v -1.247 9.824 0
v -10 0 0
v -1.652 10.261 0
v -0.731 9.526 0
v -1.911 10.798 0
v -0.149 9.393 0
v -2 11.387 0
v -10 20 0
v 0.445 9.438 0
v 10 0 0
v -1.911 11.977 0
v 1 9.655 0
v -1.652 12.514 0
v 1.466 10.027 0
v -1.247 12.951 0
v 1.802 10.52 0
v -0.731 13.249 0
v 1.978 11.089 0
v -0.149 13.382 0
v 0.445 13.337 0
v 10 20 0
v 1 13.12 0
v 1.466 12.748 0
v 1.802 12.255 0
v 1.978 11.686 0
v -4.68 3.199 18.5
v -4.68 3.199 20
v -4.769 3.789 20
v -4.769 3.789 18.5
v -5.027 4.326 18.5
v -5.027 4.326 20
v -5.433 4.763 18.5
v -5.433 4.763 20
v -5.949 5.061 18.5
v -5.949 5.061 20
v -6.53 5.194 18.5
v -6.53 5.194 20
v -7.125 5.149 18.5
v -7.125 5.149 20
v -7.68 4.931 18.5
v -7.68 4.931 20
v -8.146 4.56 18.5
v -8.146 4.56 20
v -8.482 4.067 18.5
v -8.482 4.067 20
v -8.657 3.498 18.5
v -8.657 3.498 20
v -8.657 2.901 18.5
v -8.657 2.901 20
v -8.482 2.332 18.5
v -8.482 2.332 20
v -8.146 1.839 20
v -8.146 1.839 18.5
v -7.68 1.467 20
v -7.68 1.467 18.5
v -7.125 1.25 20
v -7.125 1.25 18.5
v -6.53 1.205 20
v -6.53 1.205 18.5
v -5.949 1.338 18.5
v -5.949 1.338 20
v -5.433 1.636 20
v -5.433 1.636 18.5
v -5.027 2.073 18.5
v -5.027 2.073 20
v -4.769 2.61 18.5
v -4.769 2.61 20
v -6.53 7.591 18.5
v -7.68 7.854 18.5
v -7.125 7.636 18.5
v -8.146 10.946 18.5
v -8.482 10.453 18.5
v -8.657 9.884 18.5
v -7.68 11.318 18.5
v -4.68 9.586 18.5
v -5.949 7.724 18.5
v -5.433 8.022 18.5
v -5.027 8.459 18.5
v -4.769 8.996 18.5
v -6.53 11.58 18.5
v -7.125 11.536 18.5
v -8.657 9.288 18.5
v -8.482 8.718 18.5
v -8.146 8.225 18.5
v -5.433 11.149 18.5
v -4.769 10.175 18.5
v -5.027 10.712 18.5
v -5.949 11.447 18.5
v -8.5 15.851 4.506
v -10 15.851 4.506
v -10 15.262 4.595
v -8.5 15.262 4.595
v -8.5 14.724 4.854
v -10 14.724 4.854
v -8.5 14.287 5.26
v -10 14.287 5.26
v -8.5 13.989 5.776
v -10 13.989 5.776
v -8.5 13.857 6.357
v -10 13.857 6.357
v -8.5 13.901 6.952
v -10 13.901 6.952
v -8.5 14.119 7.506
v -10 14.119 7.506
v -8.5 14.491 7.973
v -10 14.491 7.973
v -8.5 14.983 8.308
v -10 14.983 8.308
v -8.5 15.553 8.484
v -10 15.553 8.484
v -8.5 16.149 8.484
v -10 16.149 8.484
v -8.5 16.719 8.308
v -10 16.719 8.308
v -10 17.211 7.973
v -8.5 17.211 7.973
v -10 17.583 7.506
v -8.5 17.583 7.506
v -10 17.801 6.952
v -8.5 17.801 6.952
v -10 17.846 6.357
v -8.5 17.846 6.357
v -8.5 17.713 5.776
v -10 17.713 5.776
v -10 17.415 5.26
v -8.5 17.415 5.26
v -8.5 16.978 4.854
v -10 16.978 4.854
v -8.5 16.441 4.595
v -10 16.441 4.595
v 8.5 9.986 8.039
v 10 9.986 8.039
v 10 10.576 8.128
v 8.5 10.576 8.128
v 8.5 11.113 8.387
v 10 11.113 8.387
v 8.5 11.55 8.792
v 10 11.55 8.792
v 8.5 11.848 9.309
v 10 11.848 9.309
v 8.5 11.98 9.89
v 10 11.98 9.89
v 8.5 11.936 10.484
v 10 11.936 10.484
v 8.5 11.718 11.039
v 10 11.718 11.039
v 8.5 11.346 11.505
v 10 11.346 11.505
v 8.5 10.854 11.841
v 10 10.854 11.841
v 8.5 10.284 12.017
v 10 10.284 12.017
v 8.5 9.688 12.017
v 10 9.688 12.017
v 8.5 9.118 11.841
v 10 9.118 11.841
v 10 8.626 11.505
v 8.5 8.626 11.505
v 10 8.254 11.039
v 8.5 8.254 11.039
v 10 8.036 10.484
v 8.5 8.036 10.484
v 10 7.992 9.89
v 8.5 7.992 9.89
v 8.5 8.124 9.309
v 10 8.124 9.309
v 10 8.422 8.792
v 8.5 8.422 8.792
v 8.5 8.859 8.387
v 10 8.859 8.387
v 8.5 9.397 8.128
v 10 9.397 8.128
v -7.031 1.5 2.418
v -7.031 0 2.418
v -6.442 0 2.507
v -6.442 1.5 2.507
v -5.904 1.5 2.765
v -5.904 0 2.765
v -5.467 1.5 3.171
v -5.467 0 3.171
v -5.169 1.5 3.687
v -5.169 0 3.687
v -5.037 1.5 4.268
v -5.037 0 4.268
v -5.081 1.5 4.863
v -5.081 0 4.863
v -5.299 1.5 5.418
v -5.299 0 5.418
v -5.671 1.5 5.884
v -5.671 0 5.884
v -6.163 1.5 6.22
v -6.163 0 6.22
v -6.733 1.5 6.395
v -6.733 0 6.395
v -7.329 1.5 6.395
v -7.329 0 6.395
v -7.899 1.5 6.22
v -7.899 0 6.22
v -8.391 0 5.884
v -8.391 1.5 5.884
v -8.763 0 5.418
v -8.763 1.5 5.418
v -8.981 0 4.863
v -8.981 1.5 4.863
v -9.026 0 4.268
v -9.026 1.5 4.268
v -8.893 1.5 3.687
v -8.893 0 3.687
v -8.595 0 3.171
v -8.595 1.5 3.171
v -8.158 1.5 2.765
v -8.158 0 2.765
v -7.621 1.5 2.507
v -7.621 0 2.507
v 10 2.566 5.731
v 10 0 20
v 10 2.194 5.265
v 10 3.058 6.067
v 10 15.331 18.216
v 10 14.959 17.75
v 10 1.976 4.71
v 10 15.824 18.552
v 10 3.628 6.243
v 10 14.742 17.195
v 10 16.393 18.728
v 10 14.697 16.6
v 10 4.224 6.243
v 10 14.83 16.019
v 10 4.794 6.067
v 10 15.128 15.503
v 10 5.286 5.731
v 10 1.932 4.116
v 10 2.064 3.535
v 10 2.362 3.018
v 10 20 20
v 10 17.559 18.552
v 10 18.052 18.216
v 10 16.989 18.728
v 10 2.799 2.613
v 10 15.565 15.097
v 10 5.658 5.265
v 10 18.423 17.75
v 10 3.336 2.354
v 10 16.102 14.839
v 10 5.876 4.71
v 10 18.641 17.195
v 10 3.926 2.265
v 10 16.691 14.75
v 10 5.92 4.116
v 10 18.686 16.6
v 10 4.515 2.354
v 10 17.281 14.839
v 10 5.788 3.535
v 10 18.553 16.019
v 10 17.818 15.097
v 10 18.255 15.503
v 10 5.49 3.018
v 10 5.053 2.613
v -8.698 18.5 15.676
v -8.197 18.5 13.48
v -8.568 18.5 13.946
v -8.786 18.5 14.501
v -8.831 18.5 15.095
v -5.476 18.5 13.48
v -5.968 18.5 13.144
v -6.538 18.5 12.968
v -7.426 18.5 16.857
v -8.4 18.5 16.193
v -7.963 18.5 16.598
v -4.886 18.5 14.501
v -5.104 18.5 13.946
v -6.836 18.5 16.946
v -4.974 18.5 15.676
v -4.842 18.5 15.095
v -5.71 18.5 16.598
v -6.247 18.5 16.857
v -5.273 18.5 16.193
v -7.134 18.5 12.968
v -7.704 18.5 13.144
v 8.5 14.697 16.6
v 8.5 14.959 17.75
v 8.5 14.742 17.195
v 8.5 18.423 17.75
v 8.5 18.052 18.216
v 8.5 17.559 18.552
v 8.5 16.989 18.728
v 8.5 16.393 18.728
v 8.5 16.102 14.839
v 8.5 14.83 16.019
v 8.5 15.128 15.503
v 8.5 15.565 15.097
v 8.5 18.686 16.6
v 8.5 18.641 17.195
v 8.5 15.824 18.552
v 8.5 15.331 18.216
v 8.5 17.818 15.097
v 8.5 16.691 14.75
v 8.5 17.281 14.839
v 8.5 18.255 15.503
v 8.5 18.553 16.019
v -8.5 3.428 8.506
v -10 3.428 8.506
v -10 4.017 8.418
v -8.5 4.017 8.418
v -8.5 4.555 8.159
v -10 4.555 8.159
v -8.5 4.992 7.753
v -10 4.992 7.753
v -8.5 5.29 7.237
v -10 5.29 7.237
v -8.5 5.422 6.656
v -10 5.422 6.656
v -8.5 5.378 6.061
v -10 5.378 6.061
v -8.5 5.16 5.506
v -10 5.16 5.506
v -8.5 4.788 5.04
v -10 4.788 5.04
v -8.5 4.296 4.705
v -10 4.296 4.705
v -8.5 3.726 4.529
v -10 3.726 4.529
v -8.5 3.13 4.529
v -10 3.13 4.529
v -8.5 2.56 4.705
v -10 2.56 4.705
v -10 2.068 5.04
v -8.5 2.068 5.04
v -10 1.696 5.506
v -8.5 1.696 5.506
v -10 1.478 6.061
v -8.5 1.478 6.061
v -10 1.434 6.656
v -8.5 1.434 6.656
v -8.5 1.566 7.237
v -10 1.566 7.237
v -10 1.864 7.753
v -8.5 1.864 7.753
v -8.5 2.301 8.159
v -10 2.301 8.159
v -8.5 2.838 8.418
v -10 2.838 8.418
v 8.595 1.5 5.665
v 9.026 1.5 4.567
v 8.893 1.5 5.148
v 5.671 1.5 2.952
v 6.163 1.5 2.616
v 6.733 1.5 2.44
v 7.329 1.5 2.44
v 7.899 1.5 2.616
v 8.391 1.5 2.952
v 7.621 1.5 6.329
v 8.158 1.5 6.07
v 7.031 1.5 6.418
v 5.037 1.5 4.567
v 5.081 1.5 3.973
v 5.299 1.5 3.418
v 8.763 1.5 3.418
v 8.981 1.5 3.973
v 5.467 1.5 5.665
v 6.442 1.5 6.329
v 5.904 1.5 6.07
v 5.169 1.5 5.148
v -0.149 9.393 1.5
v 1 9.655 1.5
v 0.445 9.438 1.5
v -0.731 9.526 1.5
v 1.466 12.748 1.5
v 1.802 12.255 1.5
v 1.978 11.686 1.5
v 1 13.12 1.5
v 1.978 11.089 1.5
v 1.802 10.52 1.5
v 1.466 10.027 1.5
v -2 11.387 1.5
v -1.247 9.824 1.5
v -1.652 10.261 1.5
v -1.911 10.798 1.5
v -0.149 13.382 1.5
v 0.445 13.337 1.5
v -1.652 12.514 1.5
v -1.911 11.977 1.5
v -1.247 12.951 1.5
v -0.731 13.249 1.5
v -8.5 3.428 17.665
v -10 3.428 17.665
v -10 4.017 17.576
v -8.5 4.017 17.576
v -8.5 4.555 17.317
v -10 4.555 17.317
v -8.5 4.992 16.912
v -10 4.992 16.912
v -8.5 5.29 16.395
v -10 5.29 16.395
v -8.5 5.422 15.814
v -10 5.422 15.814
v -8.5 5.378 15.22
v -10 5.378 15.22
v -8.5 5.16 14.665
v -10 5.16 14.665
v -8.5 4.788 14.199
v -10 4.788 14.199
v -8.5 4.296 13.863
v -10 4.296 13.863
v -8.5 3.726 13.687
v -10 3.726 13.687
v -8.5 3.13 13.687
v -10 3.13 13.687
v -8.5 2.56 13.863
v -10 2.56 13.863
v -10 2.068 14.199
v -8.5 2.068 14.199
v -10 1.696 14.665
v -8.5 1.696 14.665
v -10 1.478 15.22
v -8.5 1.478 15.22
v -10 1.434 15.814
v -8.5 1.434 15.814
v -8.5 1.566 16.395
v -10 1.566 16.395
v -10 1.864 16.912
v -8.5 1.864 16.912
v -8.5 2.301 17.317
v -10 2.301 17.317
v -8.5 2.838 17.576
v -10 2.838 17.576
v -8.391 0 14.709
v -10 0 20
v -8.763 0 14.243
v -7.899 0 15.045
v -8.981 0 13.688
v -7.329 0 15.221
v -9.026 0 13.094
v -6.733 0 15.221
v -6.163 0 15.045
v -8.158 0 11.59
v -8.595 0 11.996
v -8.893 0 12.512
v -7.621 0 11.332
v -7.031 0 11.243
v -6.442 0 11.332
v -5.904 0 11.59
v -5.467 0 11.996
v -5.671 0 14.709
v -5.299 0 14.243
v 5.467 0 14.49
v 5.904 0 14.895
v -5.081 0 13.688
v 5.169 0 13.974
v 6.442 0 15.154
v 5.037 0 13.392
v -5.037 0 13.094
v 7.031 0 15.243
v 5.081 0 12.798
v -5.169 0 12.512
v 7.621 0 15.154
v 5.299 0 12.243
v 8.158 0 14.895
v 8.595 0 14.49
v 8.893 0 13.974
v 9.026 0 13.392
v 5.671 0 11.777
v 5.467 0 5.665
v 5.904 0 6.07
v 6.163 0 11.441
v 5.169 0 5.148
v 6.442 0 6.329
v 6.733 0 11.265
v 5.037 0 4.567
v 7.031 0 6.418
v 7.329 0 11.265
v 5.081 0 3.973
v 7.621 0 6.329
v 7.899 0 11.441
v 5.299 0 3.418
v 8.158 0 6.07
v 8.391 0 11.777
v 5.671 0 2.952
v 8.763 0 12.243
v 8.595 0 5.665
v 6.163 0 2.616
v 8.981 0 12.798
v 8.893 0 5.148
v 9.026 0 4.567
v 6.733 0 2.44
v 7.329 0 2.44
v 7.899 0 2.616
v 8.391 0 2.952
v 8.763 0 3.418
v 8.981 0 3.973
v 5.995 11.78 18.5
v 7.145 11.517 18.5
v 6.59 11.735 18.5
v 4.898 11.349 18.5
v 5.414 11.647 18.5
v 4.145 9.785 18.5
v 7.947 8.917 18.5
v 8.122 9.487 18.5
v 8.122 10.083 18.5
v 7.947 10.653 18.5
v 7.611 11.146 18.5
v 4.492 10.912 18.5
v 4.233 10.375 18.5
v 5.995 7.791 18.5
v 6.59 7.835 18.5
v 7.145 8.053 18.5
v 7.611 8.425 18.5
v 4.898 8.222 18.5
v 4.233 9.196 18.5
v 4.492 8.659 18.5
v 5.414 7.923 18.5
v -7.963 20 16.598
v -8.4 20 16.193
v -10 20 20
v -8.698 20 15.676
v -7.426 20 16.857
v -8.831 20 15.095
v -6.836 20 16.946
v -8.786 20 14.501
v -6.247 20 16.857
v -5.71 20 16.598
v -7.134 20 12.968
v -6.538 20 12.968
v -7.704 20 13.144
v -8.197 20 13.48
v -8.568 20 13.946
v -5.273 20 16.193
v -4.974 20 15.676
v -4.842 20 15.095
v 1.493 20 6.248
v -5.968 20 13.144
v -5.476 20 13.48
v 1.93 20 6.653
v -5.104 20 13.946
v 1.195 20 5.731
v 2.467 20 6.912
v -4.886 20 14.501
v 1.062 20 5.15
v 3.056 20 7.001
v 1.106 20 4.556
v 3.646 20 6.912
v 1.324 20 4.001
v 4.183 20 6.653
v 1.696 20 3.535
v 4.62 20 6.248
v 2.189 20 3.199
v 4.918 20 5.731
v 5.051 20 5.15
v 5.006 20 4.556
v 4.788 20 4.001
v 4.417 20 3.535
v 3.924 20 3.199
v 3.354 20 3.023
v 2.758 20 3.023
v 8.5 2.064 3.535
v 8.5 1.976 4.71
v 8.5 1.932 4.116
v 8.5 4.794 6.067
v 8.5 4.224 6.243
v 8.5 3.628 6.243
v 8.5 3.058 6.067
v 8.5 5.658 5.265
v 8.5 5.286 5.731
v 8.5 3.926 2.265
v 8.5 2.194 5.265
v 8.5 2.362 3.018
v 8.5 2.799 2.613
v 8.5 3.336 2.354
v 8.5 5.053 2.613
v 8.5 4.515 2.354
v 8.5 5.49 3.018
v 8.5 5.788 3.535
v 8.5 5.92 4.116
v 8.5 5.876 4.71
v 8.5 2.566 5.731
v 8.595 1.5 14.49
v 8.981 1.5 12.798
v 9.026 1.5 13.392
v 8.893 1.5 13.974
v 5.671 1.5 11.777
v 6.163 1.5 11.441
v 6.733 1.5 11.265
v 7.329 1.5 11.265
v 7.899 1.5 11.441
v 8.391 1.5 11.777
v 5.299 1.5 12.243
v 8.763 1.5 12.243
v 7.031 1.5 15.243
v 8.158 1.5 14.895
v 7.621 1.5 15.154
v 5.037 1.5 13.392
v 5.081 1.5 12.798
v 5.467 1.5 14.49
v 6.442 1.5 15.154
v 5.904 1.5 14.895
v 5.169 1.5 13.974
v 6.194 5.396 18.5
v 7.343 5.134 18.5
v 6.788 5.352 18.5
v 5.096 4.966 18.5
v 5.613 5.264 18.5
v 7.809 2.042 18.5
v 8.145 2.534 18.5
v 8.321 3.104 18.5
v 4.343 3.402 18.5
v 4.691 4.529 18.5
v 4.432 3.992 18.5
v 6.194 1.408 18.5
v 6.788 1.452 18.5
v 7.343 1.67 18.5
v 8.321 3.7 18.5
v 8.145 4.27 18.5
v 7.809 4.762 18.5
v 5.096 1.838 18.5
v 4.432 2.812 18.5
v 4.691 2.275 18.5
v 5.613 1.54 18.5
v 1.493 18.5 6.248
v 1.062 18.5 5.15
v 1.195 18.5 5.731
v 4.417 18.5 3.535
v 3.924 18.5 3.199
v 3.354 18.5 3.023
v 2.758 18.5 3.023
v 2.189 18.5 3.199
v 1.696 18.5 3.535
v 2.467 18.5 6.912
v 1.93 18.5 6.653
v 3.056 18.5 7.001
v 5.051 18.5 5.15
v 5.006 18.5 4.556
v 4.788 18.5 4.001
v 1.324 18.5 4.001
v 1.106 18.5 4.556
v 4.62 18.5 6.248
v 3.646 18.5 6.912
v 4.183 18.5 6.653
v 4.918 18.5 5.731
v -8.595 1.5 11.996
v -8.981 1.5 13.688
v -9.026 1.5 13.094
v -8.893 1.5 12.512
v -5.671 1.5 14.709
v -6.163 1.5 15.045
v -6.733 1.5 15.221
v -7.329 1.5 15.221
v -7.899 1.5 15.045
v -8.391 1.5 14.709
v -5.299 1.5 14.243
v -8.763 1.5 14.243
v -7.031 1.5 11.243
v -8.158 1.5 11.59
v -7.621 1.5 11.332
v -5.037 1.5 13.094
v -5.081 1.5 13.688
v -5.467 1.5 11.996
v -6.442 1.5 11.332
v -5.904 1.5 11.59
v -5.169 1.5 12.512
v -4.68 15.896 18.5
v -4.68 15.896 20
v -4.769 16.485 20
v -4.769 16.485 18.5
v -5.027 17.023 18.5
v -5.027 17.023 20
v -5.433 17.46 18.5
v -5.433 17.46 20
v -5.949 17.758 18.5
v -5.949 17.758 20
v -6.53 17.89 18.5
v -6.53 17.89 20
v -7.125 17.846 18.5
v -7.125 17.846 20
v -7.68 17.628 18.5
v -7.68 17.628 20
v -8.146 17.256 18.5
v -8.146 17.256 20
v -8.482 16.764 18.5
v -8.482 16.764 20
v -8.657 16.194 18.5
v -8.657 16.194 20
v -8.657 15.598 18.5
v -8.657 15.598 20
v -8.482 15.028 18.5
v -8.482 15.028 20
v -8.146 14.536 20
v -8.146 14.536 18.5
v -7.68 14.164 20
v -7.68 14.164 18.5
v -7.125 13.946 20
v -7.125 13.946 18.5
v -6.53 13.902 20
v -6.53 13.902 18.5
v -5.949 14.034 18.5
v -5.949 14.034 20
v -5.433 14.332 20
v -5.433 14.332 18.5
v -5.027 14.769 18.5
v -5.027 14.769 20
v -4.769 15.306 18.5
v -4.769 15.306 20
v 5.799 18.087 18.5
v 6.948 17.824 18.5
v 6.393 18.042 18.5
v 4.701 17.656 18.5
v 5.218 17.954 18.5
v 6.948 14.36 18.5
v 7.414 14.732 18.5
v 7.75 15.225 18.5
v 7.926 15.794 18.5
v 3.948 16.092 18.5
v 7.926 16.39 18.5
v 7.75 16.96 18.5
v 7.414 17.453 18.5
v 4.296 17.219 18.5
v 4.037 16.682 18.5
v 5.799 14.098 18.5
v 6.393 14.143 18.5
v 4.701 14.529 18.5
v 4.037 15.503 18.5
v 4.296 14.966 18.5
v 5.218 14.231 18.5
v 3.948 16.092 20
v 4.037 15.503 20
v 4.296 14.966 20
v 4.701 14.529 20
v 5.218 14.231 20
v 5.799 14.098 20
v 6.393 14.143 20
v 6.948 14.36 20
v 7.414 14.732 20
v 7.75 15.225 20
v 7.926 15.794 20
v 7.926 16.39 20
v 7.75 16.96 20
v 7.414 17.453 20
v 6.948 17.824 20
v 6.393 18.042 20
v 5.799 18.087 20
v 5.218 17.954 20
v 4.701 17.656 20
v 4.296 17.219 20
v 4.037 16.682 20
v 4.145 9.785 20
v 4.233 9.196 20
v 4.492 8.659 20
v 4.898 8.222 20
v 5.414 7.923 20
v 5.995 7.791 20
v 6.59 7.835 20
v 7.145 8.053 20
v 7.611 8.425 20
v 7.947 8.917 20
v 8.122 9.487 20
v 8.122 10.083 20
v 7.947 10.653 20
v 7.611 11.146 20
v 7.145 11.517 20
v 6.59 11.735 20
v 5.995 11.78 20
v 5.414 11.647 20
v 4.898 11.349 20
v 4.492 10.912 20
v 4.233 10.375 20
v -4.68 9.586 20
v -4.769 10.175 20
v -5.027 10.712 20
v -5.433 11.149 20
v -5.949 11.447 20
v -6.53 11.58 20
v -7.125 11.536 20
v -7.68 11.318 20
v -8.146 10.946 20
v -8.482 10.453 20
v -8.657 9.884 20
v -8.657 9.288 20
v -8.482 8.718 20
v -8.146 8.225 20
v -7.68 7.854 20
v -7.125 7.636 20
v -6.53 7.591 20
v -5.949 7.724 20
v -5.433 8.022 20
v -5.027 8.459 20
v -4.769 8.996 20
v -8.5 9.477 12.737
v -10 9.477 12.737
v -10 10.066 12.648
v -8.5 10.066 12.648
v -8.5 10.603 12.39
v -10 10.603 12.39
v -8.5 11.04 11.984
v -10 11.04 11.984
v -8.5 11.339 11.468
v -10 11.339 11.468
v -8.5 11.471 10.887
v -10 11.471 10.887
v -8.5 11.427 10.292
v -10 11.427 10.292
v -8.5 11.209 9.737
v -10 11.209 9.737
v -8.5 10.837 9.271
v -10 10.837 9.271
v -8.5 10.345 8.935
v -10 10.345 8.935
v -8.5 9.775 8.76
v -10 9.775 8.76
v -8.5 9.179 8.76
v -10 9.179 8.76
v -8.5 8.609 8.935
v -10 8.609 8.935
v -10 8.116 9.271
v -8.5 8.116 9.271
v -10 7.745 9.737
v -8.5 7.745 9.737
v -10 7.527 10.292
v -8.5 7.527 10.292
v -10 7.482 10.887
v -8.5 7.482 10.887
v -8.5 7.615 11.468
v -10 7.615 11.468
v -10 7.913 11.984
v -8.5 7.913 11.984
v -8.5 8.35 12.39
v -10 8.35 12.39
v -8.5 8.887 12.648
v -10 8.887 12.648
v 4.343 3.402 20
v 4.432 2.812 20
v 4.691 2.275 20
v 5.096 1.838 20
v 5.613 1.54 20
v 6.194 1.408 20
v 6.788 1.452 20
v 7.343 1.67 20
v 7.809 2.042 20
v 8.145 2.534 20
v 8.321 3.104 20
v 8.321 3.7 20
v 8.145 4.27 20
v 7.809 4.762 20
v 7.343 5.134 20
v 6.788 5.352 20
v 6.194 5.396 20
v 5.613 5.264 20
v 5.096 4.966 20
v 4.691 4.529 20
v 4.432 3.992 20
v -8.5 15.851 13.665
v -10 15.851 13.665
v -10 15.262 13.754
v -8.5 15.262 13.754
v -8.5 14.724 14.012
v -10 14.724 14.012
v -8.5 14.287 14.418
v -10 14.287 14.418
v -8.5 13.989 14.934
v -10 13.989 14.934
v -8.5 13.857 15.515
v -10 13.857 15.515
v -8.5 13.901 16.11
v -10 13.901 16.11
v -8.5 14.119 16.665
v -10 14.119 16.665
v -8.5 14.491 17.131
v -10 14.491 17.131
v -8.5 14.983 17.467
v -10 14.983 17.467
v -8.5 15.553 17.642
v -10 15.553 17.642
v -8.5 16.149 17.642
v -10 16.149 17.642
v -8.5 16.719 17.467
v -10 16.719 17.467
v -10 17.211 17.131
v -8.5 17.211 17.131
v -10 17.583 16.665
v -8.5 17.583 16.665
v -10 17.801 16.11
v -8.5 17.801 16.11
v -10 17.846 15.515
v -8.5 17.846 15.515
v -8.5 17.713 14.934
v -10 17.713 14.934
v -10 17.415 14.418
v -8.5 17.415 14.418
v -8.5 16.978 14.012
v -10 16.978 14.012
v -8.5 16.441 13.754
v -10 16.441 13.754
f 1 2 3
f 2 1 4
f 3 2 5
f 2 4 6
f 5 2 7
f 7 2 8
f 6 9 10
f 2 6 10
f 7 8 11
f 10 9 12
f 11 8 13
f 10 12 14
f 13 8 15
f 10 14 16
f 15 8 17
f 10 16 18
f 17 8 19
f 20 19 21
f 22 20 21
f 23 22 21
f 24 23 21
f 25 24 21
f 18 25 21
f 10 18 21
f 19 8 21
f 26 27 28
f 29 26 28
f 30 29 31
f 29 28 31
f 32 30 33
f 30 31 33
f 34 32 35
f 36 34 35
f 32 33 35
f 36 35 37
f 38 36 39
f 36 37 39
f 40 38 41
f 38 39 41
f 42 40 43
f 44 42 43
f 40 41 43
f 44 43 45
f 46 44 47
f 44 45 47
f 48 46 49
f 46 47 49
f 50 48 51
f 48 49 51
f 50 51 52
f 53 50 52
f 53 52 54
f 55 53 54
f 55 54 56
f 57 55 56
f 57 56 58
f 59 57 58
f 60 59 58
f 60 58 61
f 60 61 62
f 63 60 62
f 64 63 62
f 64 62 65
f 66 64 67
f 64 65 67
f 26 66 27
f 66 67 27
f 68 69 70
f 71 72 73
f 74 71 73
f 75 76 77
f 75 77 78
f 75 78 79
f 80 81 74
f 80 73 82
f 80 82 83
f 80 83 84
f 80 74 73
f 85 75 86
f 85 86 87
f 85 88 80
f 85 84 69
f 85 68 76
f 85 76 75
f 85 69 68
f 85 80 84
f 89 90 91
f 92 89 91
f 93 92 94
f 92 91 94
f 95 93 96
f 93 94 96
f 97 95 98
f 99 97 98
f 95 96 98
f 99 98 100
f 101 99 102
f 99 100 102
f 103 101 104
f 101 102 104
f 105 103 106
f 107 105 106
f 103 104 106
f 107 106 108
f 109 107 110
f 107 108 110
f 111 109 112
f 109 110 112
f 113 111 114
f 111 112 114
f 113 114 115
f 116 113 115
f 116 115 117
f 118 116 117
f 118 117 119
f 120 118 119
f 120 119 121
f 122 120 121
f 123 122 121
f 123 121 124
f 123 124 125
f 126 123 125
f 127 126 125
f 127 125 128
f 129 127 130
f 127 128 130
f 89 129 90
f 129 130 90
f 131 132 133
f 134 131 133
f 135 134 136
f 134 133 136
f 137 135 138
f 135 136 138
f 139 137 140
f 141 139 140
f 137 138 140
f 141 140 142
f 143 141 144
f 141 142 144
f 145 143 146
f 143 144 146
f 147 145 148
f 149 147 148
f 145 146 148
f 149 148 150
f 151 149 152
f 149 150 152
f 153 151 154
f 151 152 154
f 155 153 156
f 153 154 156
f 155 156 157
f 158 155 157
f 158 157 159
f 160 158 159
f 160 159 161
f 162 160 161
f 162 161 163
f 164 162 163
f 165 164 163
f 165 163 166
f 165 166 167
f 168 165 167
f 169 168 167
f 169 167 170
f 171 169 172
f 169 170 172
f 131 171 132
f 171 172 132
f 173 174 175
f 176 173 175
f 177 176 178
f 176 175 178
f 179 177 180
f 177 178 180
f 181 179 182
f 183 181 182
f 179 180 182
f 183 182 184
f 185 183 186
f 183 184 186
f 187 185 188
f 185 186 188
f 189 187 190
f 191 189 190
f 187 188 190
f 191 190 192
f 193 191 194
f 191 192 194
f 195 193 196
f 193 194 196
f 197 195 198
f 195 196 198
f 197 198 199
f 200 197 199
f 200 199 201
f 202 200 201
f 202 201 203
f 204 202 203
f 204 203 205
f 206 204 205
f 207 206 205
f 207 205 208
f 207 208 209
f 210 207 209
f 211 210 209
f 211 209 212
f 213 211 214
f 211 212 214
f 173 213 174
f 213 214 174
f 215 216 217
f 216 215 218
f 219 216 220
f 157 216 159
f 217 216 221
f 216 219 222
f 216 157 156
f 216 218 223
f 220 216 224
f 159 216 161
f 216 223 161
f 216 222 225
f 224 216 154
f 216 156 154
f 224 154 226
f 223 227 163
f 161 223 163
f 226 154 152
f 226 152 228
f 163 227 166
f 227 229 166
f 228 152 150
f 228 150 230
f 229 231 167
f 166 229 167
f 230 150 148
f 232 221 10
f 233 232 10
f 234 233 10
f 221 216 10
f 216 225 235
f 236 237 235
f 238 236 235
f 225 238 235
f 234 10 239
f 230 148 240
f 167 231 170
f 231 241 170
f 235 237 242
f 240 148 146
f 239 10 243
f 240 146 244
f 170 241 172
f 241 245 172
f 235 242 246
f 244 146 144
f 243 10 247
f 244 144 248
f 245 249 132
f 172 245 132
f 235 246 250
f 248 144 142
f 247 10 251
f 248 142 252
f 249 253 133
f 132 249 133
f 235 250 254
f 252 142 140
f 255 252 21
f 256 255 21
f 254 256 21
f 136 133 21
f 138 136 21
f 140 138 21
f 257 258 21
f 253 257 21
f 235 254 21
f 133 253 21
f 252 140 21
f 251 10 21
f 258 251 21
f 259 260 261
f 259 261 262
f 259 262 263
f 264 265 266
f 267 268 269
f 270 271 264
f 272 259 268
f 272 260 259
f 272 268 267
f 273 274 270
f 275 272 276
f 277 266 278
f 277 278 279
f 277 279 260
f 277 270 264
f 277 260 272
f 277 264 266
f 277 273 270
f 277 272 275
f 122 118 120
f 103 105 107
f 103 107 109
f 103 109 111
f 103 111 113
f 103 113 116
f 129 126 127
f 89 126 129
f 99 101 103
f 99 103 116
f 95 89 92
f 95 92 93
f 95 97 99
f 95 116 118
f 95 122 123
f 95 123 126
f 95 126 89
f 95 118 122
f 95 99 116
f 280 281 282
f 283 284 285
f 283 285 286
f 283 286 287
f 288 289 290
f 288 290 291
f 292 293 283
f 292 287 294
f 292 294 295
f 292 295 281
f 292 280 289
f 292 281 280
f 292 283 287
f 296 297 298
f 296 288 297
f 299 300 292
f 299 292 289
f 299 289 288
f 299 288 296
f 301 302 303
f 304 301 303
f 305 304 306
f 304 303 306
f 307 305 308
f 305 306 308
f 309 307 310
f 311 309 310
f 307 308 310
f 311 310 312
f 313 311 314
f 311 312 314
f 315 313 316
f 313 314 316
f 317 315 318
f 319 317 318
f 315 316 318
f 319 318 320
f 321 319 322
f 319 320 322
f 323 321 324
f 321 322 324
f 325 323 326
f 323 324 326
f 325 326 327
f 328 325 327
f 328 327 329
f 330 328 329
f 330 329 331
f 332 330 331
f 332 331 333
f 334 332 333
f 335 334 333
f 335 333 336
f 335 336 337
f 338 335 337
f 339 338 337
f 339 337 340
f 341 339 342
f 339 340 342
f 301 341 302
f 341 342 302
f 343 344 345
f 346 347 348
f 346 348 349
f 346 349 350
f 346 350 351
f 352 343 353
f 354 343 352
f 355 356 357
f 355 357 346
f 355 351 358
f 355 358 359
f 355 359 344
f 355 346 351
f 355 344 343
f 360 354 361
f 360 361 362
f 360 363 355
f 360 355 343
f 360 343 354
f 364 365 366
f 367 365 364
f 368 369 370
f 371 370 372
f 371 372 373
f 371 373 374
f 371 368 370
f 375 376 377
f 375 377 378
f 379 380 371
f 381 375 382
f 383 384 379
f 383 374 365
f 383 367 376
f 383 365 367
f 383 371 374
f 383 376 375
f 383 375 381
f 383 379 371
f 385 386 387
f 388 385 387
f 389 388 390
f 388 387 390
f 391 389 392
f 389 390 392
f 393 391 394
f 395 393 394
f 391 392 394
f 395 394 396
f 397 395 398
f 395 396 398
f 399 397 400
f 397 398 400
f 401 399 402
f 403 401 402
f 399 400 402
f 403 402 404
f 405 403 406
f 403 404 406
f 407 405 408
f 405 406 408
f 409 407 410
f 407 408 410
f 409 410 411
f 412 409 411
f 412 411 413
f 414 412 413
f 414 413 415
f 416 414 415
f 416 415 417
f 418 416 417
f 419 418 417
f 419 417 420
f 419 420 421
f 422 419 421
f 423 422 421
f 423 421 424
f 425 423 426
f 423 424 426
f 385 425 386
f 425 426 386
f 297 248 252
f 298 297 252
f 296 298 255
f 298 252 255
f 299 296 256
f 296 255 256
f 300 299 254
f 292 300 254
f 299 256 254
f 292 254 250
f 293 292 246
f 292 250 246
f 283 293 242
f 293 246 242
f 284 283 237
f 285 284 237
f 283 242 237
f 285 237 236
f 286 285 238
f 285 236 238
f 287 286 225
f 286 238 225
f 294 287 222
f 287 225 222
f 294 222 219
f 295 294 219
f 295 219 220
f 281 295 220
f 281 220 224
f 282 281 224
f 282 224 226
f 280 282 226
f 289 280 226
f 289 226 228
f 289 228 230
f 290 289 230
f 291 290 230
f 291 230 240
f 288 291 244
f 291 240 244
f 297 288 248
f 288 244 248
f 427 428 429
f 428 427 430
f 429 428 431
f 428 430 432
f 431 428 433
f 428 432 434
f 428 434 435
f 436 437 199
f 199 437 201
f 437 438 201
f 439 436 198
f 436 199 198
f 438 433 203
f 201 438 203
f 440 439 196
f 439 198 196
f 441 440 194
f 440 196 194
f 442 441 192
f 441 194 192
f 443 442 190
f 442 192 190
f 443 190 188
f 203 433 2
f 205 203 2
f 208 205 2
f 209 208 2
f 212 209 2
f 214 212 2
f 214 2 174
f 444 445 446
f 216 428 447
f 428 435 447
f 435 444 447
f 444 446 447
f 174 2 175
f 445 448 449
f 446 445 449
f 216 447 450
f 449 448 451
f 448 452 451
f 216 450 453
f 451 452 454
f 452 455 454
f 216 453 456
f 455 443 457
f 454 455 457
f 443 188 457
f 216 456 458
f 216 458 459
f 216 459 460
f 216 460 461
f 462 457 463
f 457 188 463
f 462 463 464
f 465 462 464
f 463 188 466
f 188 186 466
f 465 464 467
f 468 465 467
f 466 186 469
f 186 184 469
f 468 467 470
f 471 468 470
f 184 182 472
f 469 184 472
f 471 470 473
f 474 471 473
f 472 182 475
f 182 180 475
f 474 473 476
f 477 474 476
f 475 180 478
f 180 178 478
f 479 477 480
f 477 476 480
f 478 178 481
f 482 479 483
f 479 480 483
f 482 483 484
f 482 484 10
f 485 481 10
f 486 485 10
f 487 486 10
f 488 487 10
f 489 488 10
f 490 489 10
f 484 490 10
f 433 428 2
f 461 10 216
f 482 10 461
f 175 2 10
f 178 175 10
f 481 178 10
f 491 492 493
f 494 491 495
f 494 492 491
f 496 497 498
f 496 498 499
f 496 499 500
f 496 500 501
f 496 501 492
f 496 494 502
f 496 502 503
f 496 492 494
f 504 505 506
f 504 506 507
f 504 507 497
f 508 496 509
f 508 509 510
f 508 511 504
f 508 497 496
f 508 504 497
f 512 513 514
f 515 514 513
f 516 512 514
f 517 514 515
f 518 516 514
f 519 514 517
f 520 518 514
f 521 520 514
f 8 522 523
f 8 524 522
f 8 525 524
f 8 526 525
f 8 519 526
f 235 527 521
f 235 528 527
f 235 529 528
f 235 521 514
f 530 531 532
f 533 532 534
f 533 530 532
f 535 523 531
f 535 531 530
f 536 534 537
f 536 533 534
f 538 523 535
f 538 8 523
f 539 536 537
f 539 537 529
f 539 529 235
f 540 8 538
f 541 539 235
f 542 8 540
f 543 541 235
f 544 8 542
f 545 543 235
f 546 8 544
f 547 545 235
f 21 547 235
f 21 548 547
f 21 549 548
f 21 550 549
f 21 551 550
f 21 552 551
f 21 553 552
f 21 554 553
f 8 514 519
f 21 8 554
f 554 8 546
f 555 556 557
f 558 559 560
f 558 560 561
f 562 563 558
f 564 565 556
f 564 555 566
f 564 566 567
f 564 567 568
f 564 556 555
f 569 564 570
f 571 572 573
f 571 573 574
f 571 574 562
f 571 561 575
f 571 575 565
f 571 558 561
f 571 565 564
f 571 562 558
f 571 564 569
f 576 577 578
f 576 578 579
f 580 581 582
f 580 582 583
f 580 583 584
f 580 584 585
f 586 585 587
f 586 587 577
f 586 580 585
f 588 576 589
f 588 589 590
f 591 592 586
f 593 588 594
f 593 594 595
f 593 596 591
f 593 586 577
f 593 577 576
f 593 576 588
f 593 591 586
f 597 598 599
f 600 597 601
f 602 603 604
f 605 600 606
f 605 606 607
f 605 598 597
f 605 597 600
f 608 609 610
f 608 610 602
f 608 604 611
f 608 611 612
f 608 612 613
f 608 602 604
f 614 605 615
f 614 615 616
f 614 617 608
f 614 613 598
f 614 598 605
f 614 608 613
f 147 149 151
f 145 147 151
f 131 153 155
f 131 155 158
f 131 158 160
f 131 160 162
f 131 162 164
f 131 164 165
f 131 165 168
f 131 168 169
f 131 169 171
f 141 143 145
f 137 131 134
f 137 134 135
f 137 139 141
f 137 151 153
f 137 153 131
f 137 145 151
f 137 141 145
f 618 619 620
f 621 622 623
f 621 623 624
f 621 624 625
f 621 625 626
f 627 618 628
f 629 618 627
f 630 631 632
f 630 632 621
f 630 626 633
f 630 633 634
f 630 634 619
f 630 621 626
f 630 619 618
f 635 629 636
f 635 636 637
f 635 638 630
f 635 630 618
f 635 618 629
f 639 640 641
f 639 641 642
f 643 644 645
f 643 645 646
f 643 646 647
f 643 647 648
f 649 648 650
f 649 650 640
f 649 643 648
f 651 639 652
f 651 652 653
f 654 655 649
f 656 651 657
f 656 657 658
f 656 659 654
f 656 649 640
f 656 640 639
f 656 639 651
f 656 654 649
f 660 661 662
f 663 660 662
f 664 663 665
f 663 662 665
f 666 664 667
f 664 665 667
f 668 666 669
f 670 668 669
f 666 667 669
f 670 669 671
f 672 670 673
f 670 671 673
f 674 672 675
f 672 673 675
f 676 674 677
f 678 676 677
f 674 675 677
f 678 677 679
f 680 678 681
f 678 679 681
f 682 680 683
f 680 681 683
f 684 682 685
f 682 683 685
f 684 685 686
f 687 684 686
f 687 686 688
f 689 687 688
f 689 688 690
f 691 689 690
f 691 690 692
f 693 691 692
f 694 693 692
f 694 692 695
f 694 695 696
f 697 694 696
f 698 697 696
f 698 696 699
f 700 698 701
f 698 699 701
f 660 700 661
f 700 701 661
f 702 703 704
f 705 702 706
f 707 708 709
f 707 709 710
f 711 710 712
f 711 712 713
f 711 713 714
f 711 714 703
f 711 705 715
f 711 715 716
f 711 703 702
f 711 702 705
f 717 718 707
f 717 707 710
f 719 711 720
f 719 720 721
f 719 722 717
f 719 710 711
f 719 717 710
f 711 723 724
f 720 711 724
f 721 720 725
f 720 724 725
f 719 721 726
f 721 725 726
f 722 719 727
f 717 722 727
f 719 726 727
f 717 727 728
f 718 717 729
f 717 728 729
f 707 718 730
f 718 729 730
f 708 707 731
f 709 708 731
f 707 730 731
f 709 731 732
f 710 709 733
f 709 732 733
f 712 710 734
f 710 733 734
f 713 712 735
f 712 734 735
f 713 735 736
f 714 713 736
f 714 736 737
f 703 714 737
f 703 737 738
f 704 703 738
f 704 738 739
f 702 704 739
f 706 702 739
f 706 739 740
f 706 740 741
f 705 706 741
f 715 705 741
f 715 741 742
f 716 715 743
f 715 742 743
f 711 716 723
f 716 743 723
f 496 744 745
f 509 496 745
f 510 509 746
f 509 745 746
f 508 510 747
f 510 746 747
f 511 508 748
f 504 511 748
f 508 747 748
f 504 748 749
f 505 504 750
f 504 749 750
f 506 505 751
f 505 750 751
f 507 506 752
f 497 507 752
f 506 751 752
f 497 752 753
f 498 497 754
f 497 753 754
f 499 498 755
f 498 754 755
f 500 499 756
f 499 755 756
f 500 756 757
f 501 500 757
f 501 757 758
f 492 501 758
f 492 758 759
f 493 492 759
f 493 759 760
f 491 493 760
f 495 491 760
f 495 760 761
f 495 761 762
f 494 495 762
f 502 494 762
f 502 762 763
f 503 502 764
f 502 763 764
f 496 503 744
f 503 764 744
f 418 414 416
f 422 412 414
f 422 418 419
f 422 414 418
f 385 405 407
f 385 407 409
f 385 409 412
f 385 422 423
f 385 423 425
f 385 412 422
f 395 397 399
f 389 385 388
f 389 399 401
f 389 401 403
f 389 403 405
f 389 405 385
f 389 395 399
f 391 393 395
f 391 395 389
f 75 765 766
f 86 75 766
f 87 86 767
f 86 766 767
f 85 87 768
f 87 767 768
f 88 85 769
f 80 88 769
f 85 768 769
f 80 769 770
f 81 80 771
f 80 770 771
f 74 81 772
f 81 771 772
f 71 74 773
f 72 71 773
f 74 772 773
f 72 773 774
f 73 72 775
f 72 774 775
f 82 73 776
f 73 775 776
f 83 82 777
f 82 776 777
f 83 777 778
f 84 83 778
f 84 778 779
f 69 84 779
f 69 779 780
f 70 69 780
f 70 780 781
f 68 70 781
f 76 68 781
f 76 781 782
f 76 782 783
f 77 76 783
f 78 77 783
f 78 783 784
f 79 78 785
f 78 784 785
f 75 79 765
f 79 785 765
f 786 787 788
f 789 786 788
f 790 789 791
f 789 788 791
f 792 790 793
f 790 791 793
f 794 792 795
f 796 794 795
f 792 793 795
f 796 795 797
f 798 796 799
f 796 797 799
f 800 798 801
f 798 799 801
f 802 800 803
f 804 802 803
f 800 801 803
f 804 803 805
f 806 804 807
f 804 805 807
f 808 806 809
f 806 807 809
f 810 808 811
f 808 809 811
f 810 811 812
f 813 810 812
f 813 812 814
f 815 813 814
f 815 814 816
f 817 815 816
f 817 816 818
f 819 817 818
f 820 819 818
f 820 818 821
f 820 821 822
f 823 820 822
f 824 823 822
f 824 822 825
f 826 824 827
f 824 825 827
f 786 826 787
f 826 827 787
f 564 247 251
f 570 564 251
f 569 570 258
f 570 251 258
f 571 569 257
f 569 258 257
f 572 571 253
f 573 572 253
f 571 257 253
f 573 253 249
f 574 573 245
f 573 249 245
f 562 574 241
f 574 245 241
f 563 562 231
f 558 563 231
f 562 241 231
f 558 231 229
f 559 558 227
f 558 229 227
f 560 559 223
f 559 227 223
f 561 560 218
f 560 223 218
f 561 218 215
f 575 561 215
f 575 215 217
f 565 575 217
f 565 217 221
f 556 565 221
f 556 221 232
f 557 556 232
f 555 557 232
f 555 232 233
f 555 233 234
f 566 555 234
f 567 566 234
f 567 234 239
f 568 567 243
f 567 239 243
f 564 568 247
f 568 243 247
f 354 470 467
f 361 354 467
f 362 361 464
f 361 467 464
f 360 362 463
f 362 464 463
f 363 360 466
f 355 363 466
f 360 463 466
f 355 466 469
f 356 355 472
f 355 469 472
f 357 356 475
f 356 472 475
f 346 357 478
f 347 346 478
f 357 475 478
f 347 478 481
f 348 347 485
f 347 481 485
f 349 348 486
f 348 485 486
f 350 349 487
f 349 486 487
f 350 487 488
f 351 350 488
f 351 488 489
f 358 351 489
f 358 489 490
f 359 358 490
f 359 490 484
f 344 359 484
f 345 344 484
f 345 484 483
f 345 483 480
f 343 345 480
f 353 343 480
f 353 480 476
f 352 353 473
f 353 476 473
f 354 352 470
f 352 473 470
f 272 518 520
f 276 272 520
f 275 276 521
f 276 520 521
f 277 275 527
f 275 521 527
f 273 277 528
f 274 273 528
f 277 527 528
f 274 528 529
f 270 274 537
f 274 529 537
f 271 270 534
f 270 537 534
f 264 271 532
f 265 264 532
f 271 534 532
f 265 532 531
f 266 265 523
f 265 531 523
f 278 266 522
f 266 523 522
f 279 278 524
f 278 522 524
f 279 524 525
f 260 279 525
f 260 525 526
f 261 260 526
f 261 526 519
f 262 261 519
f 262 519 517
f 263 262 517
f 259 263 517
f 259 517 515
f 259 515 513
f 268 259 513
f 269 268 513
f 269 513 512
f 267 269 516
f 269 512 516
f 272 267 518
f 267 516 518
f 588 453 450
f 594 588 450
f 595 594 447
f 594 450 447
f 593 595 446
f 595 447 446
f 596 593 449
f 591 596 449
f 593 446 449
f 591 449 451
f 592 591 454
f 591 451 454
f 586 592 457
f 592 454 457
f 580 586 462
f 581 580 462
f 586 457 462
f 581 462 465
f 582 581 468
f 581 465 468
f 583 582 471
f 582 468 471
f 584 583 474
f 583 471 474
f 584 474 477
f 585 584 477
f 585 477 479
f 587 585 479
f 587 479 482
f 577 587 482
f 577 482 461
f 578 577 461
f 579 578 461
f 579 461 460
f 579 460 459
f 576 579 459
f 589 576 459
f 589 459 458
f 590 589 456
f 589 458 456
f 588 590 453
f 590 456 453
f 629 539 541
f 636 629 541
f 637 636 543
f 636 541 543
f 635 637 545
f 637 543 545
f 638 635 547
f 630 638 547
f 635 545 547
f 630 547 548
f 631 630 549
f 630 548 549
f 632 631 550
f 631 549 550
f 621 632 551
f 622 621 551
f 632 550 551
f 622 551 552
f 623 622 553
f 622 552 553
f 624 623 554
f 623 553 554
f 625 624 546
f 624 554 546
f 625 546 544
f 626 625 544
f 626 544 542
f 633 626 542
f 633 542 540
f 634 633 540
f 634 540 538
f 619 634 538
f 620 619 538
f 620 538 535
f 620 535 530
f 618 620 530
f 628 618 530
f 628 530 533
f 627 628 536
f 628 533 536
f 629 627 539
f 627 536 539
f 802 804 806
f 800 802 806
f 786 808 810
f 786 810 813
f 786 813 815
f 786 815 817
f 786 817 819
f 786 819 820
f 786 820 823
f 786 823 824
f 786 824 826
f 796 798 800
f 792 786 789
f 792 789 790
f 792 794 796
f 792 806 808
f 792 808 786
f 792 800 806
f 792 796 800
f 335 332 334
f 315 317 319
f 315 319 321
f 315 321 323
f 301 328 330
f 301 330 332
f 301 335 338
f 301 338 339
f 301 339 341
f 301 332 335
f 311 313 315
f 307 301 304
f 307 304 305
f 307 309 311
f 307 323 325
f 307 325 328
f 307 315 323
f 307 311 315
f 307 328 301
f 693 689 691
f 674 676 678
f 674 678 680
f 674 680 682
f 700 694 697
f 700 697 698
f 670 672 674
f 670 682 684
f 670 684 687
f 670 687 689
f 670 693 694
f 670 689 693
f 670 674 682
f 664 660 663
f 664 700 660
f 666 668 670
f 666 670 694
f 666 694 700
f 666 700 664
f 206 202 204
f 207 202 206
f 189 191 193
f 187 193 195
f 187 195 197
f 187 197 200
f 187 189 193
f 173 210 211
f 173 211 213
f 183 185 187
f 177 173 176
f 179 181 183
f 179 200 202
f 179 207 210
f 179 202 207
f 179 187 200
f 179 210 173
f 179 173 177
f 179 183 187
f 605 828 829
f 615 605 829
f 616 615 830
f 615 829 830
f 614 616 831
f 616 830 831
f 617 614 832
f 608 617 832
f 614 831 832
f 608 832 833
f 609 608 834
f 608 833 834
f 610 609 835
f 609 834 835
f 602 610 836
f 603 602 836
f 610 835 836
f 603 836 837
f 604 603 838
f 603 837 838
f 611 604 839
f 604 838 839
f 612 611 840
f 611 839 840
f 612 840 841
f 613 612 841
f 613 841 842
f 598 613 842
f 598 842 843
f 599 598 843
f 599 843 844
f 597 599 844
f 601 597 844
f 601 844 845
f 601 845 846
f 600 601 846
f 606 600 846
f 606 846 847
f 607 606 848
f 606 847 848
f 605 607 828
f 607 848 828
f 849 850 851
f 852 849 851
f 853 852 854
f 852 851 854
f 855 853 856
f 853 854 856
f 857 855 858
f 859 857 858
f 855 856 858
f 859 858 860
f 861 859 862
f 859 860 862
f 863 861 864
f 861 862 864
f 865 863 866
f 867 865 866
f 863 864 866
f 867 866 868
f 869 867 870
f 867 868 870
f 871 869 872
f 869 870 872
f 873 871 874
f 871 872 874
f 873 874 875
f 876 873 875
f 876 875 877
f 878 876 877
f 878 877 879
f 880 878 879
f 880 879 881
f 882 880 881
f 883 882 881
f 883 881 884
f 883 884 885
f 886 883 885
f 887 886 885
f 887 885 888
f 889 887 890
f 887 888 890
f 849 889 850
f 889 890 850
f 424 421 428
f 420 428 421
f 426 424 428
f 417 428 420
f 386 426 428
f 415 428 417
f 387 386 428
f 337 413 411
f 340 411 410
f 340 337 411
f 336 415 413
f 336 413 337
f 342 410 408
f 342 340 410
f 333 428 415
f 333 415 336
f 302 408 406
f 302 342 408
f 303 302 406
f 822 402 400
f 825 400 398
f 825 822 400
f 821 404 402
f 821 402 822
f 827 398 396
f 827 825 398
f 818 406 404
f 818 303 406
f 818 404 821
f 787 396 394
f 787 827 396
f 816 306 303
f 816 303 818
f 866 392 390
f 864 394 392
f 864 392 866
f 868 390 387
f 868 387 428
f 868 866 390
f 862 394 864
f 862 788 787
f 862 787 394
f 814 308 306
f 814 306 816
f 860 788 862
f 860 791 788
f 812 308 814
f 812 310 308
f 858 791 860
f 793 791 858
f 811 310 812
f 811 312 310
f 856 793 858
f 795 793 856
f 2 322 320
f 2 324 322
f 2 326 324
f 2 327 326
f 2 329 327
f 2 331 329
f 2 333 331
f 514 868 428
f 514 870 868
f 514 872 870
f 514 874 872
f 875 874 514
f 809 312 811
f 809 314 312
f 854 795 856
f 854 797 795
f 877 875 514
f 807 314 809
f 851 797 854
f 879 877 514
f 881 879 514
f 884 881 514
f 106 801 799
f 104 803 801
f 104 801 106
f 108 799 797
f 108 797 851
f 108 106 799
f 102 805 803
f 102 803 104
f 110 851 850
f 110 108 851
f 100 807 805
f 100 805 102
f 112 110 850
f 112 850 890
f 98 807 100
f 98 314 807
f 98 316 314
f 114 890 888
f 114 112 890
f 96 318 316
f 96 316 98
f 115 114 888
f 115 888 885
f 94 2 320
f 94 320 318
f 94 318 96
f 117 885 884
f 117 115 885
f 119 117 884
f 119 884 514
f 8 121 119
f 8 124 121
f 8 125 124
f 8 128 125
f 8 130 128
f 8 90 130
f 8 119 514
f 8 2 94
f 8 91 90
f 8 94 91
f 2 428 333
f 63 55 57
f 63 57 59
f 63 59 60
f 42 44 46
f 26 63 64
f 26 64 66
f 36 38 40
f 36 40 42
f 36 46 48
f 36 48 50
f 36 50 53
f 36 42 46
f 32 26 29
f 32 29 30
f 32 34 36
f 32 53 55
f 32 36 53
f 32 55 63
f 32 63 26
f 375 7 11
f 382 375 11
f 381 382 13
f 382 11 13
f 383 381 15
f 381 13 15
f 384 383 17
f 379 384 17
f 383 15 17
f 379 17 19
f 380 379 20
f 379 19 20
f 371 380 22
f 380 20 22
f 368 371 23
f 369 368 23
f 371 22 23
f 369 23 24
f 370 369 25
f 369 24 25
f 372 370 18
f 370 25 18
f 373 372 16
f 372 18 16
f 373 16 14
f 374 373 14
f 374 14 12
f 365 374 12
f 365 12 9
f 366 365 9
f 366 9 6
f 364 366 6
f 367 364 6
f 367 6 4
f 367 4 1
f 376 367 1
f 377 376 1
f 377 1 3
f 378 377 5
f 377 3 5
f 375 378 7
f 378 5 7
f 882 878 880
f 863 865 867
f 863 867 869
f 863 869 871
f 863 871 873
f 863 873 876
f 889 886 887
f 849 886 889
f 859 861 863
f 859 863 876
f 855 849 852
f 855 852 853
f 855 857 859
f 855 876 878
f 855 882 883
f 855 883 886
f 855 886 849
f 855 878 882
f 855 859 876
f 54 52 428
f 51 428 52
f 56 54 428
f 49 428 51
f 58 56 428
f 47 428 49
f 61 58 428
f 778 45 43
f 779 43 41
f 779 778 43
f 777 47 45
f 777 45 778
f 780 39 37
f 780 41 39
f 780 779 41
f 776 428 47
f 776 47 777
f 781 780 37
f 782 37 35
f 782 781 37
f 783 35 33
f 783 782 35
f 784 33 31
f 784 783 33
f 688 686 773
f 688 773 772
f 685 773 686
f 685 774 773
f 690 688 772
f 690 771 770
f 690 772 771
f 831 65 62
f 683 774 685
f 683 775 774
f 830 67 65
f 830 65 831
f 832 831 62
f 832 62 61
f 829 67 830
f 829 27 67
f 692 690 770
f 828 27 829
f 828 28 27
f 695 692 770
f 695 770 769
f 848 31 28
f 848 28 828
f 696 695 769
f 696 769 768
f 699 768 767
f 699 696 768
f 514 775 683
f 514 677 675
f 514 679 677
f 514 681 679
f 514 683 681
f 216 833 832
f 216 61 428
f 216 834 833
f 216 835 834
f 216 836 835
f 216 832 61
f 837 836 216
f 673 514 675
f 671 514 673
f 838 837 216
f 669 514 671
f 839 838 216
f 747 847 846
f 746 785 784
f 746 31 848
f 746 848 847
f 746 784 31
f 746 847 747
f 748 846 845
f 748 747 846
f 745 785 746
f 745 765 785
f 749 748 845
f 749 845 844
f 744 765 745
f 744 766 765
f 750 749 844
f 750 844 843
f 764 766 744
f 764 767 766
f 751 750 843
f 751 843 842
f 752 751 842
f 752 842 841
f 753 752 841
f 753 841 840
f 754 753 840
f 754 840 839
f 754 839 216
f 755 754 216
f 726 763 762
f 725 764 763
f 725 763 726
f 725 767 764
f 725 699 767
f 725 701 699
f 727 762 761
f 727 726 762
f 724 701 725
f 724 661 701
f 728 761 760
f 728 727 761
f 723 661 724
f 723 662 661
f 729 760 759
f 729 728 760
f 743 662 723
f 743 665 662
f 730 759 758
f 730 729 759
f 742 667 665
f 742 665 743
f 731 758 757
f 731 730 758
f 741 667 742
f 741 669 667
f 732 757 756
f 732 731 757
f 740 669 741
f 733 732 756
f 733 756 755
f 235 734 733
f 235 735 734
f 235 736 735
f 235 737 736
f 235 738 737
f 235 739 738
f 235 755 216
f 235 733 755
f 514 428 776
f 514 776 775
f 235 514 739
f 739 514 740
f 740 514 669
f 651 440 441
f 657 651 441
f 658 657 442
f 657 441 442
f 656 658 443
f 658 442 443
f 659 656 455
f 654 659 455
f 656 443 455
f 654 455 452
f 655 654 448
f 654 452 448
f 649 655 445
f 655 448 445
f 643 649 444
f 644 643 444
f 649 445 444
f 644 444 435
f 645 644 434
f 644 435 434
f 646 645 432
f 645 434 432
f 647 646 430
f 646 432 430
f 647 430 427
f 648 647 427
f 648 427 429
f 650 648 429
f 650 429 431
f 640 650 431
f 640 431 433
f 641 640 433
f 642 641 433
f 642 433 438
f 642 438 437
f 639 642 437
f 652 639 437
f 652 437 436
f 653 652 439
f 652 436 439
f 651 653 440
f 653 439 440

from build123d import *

# Parameters (mm, degrees)
SKETCH2_W           = 20
SKETCH2_H           = 20
BOSS_EXTRUDE1_DEPTH = 20
SKETCH3_R           = 2
CUT_EXTRUDE2_DEPTH  = 1.5
SKETCH4_R           = 2
CUT_EXTRUDE4_DEPTH  = 1.5
SKETCH5_R           = 2
CUT_EXTRUDE5_DEPTH  = 1.5
SKETCH6_R           = 2
CUT_EXTRUDE6_DEPTH  = 1.5
SKETCH7_R           = 2
CUT_EXTRUDE7_DEPTH  = 1.5
SKETCH8_R           = 2
CUT_EXTRUDE8_DEPTH  = 1.5
SKETCH9_R           = 2
CUT_EXTRUDE9_DEPTH  = 1.5


with BuildPart() as part:
    # Sketch2 → Boss-Extrude1 (new body)
    with BuildSketch(Plane.XY):
        with Locations((0, 10)):
            Rectangle(SKETCH2_W, SKETCH2_H)
    extrude(amount=BOSS_EXTRUDE1_DEPTH)

    # Sketch3 → Cut-Extrude2 (cut)
    with BuildSketch(Plane(origin=(0, 0, 0), x_dir=(-1, 0, 0), z_dir=(0, 0, -1))):
        with Locations((0, 11.387488096)):
            Circle(SKETCH3_R)
    extrude(amount=-CUT_EXTRUDE2_DEPTH, mode=Mode.SUBTRACT)

    # Sketch4 → Cut-Extrude4 (cut)
    with BuildSketch(Plane.XY.offset(20)):
        with Locations((-6.679680773, 3.199433654)):
            Circle(SKETCH4_R)
        with Locations((-6.679680773, 9.585684456)):
            Circle(SKETCH4_R)
        with Locations((-6.679680773, 15.895974219)):
            Circle(SKETCH4_R)
        with Locations(Location((5.94831499, 16.092405647, 0), (0, 0, 180))):
            Circle(SKETCH4_R)
        with Locations(Location((6.144583567, 9.785168888, 0), (0, 0, 180))):
            Circle(SKETCH4_R)
        with Locations(Location((6.343214755, 3.402007841, 0), (0, 0, 180))):
            Circle(SKETCH4_R)
    extrude(amount=-CUT_EXTRUDE4_DEPTH, mode=Mode.SUBTRACT)

    # Sketch5 → Cut-Extrude5 (cut)
    with BuildSketch(Plane.XZ):
        with Locations(Location((-7.031123571, 4.41764723, 0), (0, 0, 270))):
            Circle(SKETCH5_R)
        with Locations(Location((-7.031123571, 13.242962798, 0), (0, 0, 270))):
            Circle(SKETCH5_R)
        with Locations(Location((7.031123571, 13.242962798, 0), (0, 0, 90))):
            Circle(SKETCH5_R)
        with Locations(Location((7.031123571, 4.41764723, 0), (0, 0, 90))):
            Circle(SKETCH5_R)
    extrude(amount=-CUT_EXTRUDE5_DEPTH, mode=Mode.SUBTRACT)

    # Sketch6 → Cut-Extrude6 (cut)
    with BuildSketch(Plane(origin=(0, 20, 0), x_dir=(1, 0, 0), z_dir=(0, 1, 0))):
        with Locations(Location((-6.836211915, -14.945689643, 0), (0, 0, 270))):
            Circle(SKETCH6_R)
        with Locations(Location((3.056286481, -5.000631722, 0), (0, 0, 270))):
            Circle(SKETCH6_R)
    extrude(amount=-CUT_EXTRUDE6_DEPTH, mode=Mode.SUBTRACT)

    # Sketch7 → Cut-Extrude7 (cut)
    with BuildSketch(Plane.ZY.offset(10)):
        with Locations((15.664719218, 3.42791907)):
            Circle(SKETCH7_R)
        with Locations((6.506483369, 3.42791907)):
            Circle(SKETCH7_R)
        with Locations(Location((6.506483369, 15.851101107, 0), (0, 0, 180))):
            Circle(SKETCH7_R)
        with Locations(Location((15.664719218, 15.851101107, 0), (0, 0, 180))):
            Circle(SKETCH7_R)
    extrude(amount=-CUT_EXTRUDE7_DEPTH, mode=Mode.SUBTRACT)

    # Sketch8 → Cut-Extrude8 (cut)
    with BuildSketch(Plane.ZY.offset(10)):
        with Locations((10.73729624, 9.476774356)):
            Circle(SKETCH8_R)
    extrude(amount=-CUT_EXTRUDE8_DEPTH, mode=Mode.SUBTRACT)

    # Sketch9 → Cut-Extrude9 (cut)
    with BuildSketch(Plane(origin=(10, 0, 0), x_dir=(0, 0, -1), z_dir=(1, 0, 0))):
        with Locations((-16.749886235, 16.691371863)):
            Circle(SKETCH9_R)
        with Locations((-10.039394763, 9.986036972)):
            Circle(SKETCH9_R)
        with Locations((-4.265304833, 3.925944784)):
            Circle(SKETCH9_R)
    extrude(amount=-CUT_EXTRUDE9_DEPTH, mode=Mode.SUBTRACT)


solid = part.part
